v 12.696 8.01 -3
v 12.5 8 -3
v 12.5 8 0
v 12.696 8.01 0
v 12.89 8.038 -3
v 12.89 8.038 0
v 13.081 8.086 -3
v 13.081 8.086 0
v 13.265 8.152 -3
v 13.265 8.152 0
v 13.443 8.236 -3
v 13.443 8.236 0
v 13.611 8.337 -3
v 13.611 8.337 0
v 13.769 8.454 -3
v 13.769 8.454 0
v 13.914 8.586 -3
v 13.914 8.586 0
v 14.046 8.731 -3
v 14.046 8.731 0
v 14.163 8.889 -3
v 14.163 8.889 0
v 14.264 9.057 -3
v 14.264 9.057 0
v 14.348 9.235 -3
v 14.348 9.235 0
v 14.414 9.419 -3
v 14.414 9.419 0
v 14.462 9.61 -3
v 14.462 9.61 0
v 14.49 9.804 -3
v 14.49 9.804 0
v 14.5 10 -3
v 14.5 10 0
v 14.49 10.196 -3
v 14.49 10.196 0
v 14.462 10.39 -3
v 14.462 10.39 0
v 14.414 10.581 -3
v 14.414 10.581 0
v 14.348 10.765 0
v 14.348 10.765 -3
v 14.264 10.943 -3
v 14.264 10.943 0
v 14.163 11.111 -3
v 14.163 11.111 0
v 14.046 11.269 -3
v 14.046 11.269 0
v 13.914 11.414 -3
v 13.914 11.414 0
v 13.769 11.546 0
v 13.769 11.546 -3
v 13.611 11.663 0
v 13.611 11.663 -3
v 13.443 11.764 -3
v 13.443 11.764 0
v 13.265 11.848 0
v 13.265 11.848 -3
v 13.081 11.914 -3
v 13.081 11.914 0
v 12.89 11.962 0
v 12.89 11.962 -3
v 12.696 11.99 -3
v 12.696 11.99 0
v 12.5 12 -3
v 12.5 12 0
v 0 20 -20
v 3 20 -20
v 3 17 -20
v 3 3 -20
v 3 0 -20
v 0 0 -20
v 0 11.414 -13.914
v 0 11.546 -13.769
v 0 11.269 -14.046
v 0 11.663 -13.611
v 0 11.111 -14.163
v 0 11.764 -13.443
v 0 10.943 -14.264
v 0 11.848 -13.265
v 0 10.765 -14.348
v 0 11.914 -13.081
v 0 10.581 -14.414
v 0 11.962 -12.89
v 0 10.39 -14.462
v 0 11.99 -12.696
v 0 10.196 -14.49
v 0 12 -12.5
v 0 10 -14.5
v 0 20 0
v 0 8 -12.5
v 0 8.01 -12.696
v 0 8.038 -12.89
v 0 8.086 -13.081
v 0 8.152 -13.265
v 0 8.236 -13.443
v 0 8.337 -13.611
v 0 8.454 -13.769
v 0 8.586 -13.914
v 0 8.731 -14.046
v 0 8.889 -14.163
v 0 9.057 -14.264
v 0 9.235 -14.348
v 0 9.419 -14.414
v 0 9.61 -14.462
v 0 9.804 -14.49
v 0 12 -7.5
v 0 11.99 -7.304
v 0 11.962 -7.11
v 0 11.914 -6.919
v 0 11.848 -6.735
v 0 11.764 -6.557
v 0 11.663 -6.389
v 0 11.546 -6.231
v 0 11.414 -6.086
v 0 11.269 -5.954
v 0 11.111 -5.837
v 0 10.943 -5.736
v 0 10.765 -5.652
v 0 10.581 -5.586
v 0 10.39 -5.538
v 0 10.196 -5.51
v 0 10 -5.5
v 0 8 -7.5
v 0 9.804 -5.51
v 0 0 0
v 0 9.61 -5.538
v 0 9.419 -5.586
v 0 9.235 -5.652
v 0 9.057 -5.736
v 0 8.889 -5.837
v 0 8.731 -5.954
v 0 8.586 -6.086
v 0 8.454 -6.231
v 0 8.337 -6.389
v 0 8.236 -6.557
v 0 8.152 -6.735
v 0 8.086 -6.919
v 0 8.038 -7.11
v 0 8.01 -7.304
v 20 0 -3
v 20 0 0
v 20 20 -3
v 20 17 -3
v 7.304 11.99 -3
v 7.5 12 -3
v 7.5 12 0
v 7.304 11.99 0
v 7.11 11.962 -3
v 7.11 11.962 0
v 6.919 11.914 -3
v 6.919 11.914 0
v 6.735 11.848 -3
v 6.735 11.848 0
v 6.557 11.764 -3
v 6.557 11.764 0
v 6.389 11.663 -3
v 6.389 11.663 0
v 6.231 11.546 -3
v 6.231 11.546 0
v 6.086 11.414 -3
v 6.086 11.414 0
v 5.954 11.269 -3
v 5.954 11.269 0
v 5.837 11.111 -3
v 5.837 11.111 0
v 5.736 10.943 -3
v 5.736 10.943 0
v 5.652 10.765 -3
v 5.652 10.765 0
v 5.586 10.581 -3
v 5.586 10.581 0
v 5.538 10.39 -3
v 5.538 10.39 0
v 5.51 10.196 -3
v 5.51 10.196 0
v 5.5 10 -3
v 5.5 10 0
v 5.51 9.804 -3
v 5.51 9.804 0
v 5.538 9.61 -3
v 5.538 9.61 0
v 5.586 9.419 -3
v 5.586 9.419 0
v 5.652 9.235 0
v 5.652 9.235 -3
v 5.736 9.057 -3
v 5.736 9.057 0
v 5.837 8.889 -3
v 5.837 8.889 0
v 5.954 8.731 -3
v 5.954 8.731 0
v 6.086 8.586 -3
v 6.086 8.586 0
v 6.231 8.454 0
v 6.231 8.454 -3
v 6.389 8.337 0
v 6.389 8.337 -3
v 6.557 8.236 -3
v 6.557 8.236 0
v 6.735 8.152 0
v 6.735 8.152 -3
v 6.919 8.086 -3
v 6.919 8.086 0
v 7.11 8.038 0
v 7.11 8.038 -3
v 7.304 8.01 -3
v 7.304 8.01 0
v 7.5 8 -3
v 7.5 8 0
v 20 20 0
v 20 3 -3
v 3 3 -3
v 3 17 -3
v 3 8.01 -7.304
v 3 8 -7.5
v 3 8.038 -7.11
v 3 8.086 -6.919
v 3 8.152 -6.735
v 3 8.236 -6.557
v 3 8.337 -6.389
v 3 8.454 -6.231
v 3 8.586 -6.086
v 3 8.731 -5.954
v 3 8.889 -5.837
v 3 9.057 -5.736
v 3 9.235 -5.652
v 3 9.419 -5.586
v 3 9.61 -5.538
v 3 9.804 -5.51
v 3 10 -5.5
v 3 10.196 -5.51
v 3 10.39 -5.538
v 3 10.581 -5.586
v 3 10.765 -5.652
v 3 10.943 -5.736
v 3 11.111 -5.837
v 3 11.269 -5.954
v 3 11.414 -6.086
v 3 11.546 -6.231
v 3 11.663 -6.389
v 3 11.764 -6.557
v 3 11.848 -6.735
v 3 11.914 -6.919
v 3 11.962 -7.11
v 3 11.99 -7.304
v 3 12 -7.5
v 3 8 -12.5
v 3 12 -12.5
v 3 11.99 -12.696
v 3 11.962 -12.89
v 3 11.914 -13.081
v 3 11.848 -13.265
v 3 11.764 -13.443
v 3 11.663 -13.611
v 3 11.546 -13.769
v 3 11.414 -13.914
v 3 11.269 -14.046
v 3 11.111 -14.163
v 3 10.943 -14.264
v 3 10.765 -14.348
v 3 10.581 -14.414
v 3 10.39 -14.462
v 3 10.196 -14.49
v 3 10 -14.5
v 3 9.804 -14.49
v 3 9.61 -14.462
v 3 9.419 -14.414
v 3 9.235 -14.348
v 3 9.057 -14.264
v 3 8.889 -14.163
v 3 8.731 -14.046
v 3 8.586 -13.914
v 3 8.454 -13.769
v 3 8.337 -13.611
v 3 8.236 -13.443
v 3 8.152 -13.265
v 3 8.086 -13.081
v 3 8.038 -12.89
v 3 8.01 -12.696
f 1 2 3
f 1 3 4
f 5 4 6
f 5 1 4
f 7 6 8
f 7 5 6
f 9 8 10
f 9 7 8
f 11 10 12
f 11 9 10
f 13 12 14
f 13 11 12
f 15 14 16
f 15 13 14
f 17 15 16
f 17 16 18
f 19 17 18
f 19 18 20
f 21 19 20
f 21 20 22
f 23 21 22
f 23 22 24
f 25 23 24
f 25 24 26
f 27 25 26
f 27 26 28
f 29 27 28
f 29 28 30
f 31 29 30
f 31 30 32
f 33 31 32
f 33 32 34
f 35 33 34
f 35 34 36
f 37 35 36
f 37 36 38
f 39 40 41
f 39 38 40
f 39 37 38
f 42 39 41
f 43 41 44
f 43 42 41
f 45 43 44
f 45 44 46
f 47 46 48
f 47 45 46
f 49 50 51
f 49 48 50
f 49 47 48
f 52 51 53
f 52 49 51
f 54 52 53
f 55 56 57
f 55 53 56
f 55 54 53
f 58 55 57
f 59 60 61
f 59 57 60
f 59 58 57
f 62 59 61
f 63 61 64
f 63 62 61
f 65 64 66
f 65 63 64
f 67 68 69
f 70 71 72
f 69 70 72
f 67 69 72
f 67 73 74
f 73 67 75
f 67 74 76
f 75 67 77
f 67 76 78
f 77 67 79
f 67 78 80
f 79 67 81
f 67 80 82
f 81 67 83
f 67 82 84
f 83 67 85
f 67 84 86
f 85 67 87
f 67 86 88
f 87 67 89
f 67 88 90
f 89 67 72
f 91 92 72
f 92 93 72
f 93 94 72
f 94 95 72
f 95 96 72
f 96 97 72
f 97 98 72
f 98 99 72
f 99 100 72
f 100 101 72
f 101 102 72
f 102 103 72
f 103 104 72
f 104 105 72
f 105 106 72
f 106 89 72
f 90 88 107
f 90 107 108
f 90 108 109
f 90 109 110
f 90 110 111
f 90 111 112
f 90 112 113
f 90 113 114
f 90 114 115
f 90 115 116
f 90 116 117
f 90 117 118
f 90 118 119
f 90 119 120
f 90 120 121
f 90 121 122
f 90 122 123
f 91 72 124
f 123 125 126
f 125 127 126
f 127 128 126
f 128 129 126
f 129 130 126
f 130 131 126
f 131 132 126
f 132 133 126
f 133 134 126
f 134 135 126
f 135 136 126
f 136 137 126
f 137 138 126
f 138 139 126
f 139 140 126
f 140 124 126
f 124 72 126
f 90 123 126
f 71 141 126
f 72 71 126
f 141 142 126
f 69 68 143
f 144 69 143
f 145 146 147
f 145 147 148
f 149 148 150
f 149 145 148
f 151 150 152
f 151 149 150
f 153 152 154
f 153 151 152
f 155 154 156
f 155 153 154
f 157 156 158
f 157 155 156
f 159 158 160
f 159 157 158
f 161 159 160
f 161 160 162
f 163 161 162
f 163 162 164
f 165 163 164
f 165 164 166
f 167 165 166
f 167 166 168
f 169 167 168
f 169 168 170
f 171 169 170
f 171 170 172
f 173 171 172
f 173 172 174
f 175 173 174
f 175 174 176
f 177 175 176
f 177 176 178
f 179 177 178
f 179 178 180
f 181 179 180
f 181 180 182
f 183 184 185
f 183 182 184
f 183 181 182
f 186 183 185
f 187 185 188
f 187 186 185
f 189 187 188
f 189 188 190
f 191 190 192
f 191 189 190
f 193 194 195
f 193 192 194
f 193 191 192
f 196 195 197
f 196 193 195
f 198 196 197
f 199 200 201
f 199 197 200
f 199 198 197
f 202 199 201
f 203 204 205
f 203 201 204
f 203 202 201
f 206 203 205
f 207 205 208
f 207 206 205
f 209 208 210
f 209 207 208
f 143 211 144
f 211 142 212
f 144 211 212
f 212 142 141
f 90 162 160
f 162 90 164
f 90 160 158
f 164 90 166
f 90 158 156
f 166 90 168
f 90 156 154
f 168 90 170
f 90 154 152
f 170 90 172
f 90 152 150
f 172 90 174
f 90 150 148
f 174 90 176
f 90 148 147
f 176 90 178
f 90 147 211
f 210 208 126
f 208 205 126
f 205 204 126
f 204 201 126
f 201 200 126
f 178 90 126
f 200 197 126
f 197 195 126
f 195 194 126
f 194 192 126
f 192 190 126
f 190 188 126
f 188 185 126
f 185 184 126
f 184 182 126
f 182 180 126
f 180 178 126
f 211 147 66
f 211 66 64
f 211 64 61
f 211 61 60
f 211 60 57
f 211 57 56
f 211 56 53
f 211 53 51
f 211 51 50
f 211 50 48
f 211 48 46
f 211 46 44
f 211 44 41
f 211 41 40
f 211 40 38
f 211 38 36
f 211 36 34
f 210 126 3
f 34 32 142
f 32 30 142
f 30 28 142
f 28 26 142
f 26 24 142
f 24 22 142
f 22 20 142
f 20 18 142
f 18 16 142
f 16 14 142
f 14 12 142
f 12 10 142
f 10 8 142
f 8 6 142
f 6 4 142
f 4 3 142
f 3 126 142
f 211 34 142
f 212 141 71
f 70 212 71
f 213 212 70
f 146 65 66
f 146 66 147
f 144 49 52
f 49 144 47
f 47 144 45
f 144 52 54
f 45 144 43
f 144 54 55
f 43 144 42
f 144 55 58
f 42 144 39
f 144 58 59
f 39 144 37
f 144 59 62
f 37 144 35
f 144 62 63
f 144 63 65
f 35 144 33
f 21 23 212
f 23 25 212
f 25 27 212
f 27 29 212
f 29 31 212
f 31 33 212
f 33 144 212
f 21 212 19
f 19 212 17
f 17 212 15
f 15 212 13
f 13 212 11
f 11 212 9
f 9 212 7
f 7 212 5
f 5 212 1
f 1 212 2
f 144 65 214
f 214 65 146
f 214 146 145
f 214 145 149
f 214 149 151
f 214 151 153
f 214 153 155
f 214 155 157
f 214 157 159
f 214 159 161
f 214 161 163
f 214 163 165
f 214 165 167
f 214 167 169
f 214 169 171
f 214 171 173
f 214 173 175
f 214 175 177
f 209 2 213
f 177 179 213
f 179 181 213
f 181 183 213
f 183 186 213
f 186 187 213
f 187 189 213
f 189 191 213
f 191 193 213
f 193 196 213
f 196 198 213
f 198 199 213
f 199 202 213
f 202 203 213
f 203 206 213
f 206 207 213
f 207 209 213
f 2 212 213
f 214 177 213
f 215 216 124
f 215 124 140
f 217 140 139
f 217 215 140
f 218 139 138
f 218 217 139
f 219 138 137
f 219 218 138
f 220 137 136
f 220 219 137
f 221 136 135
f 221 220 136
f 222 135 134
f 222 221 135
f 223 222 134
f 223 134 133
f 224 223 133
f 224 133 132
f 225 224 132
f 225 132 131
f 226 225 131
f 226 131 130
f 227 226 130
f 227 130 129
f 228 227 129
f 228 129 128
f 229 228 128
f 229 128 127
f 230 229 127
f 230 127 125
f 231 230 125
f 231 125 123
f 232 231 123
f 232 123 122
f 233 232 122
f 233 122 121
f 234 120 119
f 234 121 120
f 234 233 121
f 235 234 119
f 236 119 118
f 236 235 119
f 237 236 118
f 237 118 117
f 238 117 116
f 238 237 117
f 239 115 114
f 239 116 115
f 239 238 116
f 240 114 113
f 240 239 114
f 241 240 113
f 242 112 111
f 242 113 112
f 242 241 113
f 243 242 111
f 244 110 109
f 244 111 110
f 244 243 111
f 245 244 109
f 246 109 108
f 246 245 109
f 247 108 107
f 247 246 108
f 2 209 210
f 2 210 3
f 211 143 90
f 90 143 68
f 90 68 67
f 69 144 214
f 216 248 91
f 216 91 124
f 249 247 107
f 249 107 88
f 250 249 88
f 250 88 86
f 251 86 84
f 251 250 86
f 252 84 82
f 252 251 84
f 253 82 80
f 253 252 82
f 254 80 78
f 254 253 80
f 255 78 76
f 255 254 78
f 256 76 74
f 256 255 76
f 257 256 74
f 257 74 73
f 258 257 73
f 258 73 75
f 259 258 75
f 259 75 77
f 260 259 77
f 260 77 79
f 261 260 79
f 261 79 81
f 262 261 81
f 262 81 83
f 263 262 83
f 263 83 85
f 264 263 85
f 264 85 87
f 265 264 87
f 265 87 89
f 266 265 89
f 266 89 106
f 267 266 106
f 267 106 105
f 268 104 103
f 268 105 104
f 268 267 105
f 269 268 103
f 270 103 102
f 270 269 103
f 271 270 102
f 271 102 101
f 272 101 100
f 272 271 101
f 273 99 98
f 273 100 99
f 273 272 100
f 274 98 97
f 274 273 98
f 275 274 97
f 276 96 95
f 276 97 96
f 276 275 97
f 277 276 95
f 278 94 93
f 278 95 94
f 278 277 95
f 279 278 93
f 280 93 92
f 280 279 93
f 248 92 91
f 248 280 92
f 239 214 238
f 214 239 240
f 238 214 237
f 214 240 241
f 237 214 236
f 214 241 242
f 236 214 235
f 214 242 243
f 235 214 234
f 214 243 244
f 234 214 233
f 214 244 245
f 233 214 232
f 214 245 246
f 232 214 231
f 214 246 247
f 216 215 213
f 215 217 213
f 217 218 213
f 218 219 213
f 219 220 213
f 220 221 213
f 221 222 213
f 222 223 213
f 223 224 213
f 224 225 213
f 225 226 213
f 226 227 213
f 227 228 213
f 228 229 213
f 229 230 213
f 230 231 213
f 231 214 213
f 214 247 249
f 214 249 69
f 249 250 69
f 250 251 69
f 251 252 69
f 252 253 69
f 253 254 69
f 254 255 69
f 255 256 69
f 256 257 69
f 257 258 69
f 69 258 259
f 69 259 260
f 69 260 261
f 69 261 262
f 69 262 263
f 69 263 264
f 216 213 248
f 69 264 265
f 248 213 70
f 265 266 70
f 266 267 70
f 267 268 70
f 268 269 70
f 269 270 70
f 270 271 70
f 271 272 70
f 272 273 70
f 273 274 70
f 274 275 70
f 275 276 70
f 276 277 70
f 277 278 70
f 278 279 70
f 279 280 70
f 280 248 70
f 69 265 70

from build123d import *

# Parameters (mm, degrees)
EXTRUDE_2_DEPTH     = 20
EXTRUDE_1_DEPTH     = 3
EXTRUDE_2_2_DEPTH   = 3
CUT_EXTRUDE_1_DEPTH = 34
CUT_EXTRUDE_2_DEPTH = 34


with BuildPart() as part:
    # 草图1 → Extrude 2 (new body)
    with BuildSketch(Plane(origin=(0, 0, 0), x_dir=(1, 0, 0), z_dir=(0, 1, 0))):
        Polygon((0, 20), (0, 0), (20, 0), (20, 3), (3, 3), (3, 20), align=None)
    extrude(amount=EXTRUDE_2_DEPTH)

    # 草图2 → 凸台-拉伸1 (add)
    with BuildSketch(Plane(origin=(0, 20, 0), x_dir=(1, 0, 0), z_dir=(0, 1, 0))):
        Polygon((3, 20), (20, 3), (20, 0), (0, 0), (0, 20), align=None)
    extrude(amount=-EXTRUDE_1_DEPTH)

    # 草图3 → Extrude 2 2 (add)
    with BuildSketch(Plane.XZ):
        Polygon((20, -3), (3, -20), (3, -3), align=None)
    extrude(amount=-EXTRUDE_2_2_DEPTH)

    # 草图5 → 切除-拉伸1 (cut, through all)
    with BuildSketch(Plane(origin=(0, 0, -3), x_dir=(-1, 0, 0), z_dir=(0, 0, -1))):
        with BuildLine():
            Line((-7.5, 8), (-12.5, 8))
            ThreePointArc((-12.5, 8), (-14.5, 10), (-12.5, 12))
            Line((-12.5, 12), (-7.5, 12))
            ThreePointArc((-7.5, 12), (-5.5, 10), (-7.5, 8))
        make_face()
    extrude(amount=-CUT_EXTRUDE_1_DEPTH, mode=Mode.SUBTRACT)

    # 草图6 → 切除-拉伸2 (cut, through all)
    with BuildSketch(Plane(origin=(3, 0, 0), x_dir=(0, 0, -1), z_dir=(1, 0, 0))):
        with BuildLine():
            Line((7.5, 12), (12.5, 12))
            ThreePointArc((12.5, 12), (14.5, 10), (12.5, 8))
            Line((12.5, 8), (7.5, 8))
            ThreePointArc((7.5, 8), (5.5, 10), (7.5, 12))
        make_face()
    extrude(amount=-CUT_EXTRUDE_2_DEPTH, mode=Mode.SUBTRACT)


solid = part.part
